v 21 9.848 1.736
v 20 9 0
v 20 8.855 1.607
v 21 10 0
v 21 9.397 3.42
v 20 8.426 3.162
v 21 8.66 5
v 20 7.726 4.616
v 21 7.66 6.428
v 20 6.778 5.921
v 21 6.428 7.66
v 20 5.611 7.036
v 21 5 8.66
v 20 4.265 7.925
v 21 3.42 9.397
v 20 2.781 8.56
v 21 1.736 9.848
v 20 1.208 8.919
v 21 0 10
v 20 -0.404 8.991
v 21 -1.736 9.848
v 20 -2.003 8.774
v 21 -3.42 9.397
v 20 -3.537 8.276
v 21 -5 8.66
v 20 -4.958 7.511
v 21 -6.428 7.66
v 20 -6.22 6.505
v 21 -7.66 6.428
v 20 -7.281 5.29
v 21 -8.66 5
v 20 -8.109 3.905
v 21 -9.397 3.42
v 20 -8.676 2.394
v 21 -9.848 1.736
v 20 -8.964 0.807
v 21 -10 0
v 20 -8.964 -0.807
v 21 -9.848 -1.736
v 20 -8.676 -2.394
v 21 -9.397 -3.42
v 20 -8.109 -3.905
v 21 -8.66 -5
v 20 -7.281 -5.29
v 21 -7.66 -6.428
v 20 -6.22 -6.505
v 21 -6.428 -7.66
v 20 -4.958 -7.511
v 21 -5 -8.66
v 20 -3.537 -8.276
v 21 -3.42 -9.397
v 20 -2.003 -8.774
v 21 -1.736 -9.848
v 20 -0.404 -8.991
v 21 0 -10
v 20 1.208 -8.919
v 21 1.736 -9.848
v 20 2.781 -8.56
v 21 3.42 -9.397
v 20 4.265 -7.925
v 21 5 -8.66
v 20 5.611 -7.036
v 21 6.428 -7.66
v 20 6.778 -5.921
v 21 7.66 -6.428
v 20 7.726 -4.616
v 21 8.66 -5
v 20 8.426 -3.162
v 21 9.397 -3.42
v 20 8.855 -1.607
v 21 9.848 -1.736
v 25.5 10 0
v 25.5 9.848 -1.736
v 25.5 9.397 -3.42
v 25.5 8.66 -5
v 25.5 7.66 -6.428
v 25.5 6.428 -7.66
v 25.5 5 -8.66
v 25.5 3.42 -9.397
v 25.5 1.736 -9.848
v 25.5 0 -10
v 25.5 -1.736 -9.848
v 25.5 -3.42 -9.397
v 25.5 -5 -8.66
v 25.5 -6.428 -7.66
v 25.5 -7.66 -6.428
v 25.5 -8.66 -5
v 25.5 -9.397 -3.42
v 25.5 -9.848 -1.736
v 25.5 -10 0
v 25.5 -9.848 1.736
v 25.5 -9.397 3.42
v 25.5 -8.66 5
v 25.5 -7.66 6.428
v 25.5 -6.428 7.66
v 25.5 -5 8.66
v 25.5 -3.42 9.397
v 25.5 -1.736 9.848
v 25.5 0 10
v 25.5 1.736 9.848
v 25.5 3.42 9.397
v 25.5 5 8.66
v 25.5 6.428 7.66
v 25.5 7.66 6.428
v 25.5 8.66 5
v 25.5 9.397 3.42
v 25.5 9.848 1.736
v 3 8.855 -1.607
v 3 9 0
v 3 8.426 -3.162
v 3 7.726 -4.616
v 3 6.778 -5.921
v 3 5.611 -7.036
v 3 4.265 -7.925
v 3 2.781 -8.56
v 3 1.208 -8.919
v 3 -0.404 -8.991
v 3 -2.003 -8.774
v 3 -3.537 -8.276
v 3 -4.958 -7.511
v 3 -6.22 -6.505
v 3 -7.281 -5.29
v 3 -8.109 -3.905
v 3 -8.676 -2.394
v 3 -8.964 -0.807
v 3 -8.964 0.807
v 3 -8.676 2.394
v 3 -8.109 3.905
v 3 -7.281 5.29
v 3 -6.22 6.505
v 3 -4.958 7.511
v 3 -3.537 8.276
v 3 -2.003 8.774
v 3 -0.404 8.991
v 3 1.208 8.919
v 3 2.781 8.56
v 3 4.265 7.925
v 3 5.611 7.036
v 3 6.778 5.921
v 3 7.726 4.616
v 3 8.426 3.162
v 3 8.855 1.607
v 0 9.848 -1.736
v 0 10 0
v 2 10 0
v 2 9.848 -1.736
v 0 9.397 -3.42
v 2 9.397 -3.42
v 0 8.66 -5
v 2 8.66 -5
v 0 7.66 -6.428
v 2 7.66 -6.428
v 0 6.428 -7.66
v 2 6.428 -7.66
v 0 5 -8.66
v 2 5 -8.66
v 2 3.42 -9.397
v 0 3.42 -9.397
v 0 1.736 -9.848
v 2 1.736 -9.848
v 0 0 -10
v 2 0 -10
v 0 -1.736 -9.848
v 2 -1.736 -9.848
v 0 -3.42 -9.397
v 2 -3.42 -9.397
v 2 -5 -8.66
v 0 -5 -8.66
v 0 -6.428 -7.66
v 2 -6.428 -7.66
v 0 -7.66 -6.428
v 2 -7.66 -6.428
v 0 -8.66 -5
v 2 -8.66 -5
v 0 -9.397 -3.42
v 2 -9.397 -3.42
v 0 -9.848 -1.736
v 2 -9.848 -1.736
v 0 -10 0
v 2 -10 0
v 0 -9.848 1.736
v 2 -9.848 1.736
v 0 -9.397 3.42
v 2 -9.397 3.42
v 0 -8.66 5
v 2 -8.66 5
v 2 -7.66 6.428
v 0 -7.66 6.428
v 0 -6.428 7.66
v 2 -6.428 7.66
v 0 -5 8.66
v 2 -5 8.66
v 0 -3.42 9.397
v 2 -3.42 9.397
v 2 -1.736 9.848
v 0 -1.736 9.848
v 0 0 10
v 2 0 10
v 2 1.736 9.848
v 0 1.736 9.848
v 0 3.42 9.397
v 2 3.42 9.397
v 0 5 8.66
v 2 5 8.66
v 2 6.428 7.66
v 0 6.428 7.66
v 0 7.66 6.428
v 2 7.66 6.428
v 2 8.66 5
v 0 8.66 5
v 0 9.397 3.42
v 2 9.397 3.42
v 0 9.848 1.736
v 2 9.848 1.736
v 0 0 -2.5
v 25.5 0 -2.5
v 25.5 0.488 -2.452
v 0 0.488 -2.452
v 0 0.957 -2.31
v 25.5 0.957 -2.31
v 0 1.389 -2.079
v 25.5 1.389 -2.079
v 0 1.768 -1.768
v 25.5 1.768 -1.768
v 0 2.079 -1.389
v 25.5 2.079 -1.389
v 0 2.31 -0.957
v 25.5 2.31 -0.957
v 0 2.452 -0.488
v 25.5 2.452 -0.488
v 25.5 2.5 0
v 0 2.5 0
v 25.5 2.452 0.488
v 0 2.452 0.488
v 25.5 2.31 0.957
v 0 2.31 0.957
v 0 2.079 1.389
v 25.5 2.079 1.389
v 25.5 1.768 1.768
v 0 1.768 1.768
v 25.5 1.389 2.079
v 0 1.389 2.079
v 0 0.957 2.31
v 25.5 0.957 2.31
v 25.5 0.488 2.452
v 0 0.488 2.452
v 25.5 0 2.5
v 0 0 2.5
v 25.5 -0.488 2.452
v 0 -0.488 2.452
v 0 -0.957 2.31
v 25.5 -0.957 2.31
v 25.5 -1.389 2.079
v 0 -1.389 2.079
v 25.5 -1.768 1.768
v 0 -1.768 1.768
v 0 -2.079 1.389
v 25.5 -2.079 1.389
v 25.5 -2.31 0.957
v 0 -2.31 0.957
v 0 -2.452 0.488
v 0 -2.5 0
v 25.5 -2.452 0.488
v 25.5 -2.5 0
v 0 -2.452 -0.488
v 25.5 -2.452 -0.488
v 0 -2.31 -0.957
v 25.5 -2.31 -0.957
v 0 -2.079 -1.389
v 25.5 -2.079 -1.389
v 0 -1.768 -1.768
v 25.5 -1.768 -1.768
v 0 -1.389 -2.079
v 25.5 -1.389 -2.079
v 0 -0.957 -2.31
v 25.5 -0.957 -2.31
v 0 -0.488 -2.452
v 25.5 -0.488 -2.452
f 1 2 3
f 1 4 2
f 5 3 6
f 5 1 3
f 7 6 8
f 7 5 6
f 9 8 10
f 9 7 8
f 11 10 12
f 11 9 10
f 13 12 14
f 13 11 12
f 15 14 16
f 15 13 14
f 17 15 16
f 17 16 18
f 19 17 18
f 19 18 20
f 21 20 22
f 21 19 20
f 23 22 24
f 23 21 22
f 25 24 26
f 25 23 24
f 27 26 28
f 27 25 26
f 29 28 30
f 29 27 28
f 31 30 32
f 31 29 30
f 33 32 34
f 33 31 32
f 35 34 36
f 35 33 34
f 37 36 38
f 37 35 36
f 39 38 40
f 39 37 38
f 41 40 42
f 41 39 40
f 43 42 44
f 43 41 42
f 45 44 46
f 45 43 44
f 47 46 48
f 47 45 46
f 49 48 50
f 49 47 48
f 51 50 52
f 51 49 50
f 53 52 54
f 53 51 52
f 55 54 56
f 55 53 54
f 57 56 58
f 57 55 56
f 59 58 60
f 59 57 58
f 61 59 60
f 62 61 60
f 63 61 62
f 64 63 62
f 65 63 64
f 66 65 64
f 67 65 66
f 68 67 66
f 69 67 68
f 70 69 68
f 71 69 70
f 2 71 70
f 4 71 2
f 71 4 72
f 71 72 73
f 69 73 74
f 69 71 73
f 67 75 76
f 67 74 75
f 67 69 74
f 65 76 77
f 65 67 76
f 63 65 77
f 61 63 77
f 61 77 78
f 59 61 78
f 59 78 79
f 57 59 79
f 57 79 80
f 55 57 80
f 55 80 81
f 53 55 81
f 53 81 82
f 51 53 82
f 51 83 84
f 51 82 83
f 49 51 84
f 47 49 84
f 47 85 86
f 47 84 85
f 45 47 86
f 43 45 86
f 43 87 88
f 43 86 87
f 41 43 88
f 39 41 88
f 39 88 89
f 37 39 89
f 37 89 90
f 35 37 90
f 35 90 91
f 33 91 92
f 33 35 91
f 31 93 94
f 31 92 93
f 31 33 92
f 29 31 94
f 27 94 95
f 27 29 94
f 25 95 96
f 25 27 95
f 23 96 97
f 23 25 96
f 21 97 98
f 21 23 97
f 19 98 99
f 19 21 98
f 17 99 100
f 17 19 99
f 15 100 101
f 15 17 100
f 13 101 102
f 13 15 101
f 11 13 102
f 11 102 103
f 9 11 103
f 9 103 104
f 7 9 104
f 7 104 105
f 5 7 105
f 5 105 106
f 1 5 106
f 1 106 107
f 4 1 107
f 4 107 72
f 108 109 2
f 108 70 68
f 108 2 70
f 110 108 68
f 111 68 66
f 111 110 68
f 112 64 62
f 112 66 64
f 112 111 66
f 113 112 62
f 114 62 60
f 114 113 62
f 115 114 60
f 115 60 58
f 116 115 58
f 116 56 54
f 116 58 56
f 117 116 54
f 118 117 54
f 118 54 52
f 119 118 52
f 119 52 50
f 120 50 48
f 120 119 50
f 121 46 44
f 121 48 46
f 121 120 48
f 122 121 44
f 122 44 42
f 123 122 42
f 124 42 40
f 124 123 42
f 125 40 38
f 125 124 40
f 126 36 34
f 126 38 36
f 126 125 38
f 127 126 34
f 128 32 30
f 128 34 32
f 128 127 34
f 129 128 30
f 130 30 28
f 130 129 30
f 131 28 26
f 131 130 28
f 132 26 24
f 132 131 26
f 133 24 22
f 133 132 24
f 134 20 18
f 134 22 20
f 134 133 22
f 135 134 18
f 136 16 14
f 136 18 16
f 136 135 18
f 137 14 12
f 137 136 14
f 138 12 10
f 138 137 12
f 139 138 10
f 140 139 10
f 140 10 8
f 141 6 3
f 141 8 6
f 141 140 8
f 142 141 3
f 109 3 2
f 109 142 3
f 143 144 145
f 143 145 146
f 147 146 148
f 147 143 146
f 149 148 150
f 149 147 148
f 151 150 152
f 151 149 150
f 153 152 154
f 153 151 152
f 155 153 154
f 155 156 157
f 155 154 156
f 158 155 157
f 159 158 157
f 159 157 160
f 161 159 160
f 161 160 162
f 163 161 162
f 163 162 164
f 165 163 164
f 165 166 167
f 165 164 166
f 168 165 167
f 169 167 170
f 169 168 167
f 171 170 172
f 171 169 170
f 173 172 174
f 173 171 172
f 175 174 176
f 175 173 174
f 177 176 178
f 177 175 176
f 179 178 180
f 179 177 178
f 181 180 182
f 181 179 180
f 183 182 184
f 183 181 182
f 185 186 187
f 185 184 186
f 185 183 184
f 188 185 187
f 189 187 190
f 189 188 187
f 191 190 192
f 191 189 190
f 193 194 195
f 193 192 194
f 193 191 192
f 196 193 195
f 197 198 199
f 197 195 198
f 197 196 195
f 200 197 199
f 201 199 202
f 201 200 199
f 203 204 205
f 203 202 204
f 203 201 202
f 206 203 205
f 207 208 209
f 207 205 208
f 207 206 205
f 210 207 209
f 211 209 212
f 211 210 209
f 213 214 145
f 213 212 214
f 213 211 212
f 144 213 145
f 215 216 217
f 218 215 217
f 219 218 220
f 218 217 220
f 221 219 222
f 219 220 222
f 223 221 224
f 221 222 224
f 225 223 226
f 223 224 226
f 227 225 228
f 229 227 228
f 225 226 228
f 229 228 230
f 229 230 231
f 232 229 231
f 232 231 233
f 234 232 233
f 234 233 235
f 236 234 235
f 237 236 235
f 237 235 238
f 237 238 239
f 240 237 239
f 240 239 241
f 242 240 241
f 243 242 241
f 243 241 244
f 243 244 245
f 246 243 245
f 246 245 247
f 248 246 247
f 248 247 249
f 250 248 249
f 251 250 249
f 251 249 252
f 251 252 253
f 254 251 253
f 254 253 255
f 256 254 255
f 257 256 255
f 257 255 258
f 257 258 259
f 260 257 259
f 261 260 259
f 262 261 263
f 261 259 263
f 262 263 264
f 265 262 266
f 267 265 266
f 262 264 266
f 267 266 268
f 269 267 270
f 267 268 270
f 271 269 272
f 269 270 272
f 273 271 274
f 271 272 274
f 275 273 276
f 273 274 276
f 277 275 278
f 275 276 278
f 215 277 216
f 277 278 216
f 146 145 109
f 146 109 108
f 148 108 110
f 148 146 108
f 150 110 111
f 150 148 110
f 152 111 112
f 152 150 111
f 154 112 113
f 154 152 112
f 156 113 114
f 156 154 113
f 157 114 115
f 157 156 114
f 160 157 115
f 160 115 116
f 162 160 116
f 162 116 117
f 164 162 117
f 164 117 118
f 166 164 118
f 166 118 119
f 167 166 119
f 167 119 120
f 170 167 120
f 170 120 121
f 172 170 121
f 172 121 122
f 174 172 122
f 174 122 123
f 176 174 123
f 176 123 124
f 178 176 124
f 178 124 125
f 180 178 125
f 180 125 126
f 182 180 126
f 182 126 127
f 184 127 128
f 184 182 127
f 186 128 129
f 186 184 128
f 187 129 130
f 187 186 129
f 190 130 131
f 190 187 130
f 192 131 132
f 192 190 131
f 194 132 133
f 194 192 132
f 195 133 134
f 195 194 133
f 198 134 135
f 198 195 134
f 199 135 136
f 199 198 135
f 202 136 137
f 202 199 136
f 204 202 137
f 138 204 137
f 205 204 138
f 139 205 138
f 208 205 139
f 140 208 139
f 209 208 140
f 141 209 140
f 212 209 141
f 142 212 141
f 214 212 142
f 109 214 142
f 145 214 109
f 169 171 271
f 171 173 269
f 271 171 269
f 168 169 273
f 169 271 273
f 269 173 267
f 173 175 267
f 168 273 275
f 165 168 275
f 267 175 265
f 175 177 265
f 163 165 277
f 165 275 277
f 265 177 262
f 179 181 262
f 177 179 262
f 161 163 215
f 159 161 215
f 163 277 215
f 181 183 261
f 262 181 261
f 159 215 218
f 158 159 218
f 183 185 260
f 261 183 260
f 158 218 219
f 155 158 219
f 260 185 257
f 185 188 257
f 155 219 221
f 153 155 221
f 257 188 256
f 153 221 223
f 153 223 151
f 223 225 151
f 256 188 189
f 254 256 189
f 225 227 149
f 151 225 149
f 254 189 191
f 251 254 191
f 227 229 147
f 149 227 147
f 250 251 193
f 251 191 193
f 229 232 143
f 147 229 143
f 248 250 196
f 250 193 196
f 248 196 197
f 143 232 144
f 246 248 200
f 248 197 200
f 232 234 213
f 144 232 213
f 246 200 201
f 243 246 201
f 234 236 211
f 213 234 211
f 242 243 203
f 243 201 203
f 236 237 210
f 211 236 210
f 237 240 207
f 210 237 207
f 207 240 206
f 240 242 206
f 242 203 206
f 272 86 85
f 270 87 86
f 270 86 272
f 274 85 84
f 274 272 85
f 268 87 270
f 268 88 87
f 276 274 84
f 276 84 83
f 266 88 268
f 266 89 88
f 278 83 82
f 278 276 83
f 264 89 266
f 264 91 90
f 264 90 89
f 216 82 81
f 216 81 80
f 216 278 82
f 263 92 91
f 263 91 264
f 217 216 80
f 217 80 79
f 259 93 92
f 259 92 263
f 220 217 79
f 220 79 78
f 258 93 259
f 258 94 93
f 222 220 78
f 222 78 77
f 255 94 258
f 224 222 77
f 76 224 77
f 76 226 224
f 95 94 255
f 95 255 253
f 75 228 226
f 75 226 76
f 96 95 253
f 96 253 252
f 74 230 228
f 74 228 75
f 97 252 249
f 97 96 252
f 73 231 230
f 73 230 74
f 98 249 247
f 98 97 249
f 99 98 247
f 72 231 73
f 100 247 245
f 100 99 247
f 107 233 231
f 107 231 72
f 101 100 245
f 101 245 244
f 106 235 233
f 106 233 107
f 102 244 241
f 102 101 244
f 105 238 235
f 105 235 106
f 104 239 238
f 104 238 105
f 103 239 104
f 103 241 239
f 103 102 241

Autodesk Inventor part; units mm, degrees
ref_plane "YZ Plane" through (0, 0, 0) normal (1, 0, 0) x (0, 1, 0)
ref_plane "XZ Plane" through (0, 0, 0) normal (0, 1, 0) x (-1, 0, 0)
ref_plane "XY Plane" through (0, 0, 0) normal (0, 0, 1) x (1, 0, 0)
sketch "Sketch1" plane through (0, 0, 0) normal (0, 0, 1) x (1, 0, 0)
  line L0 (0, 0) -> (25.5, 0)
  line L1 (25.5, 0) -> (25.5, 10)
  line L2 (25.5, 10) -> (21, 10)
  line L3 (21, 10) -> (20, 9)
  line L4 (20, 9) -> (3, 9)
  line L5 (3, 9) -> (2, 10)
  line L6 (2, 10) -> (0, 10)
  line L7 (0, 10) -> (0, 0)
  dimension "d0" = 25.5
  dimension "d1" = 9
  dimension "d2" = 17
  dimension "d3" = 1
  dimension "d4" = 2
revolve "Revolution1" add sketch "Sketch1" angle 360 about axis through (0, 0, 0) along (1, 0, 0)
sketch "Sketch2" plane through (25.5, 0, 0) normal (1, 0, 0) x (0, 0, -1)
  circle A0 centre (0, 0) radius 10 projected
  circle A1 centre (0, 0) radius 2.5
  dimension "d6" = 5
extrude "Extrusion1" cut sketch "Sketch2" against normal through all contours A1
properties part number "spool"
